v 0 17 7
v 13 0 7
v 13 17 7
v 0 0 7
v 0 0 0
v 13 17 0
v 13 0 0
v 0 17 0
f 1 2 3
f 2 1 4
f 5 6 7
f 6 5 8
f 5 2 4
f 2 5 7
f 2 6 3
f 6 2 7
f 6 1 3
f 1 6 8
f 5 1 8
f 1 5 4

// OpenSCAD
// Generated by SolidPython 1.0.1 on 2020-07-29 00:46:55


cube(size = [13, 17, 7]);
/***********************************************
*********      SolidPython code:      **********
************************************************
 
# import packages: SolidPython
from solid import *
from solid.utils import *
from itertools import chain, combinations, permutations


class Resize:

    def __init__(self, scad_file):
        self.scad_file = scad_file
        #self.scad_file = import_scad(scad_file)
        # cone/cylinder param:
        self.r1 = 0
        self.r2 = 0
        self.h = 0
        # rectangular prism param:
        self.w = 0
        self.l = 0
        # ellipse param:
        self.r = 0

    # import OpenScad code (file name corresponds to shape)


    # classify shape + parameters
    def assign(self, param1, param2, param3):
        if self.scad_file == 'cone.scad':
            self.r1 = param1
            self.r2 = param2
            self.h = param3
        elif self.scad_file == 'cylinder.scad':
            self.r1 = param1
            self.r2 = param2
            self.h = param3
        elif self.scad_file == 'rectangularPrism.scad':
            self.h = param1
            self.l = param2
            self.w = param3
        else:
            self.r = param1
            self.h = param2

    # resize parameters
    def iterate(self):
        x = range(3, 20, 2)
        i = 1
        if self.scad_file == 'cone.scad':
            tempList = list(permutations(x, 2))
            for temp in tempList:
                param1 = temp[0]
                param2 = temp[1]
                filepath = 'produced_scad_files/' + 'cone' + str(param1) + '_' + str(param2) + '_' + '.scad'
                scad_render_to_file(cylinder(h=param1, r1=param2, r2=0), filepath)

        elif self.scad_file == 'cylinder.scad':
            tempList = list(permutations(x, 3))
            for temp in tempList:
                param1 = temp[0]
                param2 = temp[1]
                filepath = 'produced_scad_files/' + 'cylinder' + str(param1) + '_' + str(param2) + '_' + '.scad'
                scad_render_to_file(cylinder(h=param1, r1=param2, r2=param2), filepath)

        elif self.scad_file == 'rectangularPrism.scad':
            tempList = list(permutations(x, 3))
            for temp in tempList:
                param1 = temp[0]
                param2 = temp[1]
                param3 = temp[2]
                filepath = 'produced_scad_files/' + 'rectangularPrism' + str(param1) + '_' + str(param2) + '_' + str(
                    param3) + '.scad'
                scad_render_to_file(cube(size=(param1, param2, param3)), filepath)

        elif self.scad_file == 'ellipse.scad':
            tempList = list(permutations(x, 4))
            for temp in tempList:
                param1 = temp[0]
                param2 = temp[1]
                param3 = temp[2]
                param4 = temp[3]
                filepath = 'produced_scad_files/' + 'ellipse' + str(param1) + '_' + str(param2) + '_' + str(param3) + '_' + str(param4) + '.scad'
                scad_render_to_file(scale([param1, param2, param3])(sphere(r=param4)), filepath)

    def render_to_scadfile(self):
        scad_render_to_file(scad, 'example.scad') 
 
************************************************/
